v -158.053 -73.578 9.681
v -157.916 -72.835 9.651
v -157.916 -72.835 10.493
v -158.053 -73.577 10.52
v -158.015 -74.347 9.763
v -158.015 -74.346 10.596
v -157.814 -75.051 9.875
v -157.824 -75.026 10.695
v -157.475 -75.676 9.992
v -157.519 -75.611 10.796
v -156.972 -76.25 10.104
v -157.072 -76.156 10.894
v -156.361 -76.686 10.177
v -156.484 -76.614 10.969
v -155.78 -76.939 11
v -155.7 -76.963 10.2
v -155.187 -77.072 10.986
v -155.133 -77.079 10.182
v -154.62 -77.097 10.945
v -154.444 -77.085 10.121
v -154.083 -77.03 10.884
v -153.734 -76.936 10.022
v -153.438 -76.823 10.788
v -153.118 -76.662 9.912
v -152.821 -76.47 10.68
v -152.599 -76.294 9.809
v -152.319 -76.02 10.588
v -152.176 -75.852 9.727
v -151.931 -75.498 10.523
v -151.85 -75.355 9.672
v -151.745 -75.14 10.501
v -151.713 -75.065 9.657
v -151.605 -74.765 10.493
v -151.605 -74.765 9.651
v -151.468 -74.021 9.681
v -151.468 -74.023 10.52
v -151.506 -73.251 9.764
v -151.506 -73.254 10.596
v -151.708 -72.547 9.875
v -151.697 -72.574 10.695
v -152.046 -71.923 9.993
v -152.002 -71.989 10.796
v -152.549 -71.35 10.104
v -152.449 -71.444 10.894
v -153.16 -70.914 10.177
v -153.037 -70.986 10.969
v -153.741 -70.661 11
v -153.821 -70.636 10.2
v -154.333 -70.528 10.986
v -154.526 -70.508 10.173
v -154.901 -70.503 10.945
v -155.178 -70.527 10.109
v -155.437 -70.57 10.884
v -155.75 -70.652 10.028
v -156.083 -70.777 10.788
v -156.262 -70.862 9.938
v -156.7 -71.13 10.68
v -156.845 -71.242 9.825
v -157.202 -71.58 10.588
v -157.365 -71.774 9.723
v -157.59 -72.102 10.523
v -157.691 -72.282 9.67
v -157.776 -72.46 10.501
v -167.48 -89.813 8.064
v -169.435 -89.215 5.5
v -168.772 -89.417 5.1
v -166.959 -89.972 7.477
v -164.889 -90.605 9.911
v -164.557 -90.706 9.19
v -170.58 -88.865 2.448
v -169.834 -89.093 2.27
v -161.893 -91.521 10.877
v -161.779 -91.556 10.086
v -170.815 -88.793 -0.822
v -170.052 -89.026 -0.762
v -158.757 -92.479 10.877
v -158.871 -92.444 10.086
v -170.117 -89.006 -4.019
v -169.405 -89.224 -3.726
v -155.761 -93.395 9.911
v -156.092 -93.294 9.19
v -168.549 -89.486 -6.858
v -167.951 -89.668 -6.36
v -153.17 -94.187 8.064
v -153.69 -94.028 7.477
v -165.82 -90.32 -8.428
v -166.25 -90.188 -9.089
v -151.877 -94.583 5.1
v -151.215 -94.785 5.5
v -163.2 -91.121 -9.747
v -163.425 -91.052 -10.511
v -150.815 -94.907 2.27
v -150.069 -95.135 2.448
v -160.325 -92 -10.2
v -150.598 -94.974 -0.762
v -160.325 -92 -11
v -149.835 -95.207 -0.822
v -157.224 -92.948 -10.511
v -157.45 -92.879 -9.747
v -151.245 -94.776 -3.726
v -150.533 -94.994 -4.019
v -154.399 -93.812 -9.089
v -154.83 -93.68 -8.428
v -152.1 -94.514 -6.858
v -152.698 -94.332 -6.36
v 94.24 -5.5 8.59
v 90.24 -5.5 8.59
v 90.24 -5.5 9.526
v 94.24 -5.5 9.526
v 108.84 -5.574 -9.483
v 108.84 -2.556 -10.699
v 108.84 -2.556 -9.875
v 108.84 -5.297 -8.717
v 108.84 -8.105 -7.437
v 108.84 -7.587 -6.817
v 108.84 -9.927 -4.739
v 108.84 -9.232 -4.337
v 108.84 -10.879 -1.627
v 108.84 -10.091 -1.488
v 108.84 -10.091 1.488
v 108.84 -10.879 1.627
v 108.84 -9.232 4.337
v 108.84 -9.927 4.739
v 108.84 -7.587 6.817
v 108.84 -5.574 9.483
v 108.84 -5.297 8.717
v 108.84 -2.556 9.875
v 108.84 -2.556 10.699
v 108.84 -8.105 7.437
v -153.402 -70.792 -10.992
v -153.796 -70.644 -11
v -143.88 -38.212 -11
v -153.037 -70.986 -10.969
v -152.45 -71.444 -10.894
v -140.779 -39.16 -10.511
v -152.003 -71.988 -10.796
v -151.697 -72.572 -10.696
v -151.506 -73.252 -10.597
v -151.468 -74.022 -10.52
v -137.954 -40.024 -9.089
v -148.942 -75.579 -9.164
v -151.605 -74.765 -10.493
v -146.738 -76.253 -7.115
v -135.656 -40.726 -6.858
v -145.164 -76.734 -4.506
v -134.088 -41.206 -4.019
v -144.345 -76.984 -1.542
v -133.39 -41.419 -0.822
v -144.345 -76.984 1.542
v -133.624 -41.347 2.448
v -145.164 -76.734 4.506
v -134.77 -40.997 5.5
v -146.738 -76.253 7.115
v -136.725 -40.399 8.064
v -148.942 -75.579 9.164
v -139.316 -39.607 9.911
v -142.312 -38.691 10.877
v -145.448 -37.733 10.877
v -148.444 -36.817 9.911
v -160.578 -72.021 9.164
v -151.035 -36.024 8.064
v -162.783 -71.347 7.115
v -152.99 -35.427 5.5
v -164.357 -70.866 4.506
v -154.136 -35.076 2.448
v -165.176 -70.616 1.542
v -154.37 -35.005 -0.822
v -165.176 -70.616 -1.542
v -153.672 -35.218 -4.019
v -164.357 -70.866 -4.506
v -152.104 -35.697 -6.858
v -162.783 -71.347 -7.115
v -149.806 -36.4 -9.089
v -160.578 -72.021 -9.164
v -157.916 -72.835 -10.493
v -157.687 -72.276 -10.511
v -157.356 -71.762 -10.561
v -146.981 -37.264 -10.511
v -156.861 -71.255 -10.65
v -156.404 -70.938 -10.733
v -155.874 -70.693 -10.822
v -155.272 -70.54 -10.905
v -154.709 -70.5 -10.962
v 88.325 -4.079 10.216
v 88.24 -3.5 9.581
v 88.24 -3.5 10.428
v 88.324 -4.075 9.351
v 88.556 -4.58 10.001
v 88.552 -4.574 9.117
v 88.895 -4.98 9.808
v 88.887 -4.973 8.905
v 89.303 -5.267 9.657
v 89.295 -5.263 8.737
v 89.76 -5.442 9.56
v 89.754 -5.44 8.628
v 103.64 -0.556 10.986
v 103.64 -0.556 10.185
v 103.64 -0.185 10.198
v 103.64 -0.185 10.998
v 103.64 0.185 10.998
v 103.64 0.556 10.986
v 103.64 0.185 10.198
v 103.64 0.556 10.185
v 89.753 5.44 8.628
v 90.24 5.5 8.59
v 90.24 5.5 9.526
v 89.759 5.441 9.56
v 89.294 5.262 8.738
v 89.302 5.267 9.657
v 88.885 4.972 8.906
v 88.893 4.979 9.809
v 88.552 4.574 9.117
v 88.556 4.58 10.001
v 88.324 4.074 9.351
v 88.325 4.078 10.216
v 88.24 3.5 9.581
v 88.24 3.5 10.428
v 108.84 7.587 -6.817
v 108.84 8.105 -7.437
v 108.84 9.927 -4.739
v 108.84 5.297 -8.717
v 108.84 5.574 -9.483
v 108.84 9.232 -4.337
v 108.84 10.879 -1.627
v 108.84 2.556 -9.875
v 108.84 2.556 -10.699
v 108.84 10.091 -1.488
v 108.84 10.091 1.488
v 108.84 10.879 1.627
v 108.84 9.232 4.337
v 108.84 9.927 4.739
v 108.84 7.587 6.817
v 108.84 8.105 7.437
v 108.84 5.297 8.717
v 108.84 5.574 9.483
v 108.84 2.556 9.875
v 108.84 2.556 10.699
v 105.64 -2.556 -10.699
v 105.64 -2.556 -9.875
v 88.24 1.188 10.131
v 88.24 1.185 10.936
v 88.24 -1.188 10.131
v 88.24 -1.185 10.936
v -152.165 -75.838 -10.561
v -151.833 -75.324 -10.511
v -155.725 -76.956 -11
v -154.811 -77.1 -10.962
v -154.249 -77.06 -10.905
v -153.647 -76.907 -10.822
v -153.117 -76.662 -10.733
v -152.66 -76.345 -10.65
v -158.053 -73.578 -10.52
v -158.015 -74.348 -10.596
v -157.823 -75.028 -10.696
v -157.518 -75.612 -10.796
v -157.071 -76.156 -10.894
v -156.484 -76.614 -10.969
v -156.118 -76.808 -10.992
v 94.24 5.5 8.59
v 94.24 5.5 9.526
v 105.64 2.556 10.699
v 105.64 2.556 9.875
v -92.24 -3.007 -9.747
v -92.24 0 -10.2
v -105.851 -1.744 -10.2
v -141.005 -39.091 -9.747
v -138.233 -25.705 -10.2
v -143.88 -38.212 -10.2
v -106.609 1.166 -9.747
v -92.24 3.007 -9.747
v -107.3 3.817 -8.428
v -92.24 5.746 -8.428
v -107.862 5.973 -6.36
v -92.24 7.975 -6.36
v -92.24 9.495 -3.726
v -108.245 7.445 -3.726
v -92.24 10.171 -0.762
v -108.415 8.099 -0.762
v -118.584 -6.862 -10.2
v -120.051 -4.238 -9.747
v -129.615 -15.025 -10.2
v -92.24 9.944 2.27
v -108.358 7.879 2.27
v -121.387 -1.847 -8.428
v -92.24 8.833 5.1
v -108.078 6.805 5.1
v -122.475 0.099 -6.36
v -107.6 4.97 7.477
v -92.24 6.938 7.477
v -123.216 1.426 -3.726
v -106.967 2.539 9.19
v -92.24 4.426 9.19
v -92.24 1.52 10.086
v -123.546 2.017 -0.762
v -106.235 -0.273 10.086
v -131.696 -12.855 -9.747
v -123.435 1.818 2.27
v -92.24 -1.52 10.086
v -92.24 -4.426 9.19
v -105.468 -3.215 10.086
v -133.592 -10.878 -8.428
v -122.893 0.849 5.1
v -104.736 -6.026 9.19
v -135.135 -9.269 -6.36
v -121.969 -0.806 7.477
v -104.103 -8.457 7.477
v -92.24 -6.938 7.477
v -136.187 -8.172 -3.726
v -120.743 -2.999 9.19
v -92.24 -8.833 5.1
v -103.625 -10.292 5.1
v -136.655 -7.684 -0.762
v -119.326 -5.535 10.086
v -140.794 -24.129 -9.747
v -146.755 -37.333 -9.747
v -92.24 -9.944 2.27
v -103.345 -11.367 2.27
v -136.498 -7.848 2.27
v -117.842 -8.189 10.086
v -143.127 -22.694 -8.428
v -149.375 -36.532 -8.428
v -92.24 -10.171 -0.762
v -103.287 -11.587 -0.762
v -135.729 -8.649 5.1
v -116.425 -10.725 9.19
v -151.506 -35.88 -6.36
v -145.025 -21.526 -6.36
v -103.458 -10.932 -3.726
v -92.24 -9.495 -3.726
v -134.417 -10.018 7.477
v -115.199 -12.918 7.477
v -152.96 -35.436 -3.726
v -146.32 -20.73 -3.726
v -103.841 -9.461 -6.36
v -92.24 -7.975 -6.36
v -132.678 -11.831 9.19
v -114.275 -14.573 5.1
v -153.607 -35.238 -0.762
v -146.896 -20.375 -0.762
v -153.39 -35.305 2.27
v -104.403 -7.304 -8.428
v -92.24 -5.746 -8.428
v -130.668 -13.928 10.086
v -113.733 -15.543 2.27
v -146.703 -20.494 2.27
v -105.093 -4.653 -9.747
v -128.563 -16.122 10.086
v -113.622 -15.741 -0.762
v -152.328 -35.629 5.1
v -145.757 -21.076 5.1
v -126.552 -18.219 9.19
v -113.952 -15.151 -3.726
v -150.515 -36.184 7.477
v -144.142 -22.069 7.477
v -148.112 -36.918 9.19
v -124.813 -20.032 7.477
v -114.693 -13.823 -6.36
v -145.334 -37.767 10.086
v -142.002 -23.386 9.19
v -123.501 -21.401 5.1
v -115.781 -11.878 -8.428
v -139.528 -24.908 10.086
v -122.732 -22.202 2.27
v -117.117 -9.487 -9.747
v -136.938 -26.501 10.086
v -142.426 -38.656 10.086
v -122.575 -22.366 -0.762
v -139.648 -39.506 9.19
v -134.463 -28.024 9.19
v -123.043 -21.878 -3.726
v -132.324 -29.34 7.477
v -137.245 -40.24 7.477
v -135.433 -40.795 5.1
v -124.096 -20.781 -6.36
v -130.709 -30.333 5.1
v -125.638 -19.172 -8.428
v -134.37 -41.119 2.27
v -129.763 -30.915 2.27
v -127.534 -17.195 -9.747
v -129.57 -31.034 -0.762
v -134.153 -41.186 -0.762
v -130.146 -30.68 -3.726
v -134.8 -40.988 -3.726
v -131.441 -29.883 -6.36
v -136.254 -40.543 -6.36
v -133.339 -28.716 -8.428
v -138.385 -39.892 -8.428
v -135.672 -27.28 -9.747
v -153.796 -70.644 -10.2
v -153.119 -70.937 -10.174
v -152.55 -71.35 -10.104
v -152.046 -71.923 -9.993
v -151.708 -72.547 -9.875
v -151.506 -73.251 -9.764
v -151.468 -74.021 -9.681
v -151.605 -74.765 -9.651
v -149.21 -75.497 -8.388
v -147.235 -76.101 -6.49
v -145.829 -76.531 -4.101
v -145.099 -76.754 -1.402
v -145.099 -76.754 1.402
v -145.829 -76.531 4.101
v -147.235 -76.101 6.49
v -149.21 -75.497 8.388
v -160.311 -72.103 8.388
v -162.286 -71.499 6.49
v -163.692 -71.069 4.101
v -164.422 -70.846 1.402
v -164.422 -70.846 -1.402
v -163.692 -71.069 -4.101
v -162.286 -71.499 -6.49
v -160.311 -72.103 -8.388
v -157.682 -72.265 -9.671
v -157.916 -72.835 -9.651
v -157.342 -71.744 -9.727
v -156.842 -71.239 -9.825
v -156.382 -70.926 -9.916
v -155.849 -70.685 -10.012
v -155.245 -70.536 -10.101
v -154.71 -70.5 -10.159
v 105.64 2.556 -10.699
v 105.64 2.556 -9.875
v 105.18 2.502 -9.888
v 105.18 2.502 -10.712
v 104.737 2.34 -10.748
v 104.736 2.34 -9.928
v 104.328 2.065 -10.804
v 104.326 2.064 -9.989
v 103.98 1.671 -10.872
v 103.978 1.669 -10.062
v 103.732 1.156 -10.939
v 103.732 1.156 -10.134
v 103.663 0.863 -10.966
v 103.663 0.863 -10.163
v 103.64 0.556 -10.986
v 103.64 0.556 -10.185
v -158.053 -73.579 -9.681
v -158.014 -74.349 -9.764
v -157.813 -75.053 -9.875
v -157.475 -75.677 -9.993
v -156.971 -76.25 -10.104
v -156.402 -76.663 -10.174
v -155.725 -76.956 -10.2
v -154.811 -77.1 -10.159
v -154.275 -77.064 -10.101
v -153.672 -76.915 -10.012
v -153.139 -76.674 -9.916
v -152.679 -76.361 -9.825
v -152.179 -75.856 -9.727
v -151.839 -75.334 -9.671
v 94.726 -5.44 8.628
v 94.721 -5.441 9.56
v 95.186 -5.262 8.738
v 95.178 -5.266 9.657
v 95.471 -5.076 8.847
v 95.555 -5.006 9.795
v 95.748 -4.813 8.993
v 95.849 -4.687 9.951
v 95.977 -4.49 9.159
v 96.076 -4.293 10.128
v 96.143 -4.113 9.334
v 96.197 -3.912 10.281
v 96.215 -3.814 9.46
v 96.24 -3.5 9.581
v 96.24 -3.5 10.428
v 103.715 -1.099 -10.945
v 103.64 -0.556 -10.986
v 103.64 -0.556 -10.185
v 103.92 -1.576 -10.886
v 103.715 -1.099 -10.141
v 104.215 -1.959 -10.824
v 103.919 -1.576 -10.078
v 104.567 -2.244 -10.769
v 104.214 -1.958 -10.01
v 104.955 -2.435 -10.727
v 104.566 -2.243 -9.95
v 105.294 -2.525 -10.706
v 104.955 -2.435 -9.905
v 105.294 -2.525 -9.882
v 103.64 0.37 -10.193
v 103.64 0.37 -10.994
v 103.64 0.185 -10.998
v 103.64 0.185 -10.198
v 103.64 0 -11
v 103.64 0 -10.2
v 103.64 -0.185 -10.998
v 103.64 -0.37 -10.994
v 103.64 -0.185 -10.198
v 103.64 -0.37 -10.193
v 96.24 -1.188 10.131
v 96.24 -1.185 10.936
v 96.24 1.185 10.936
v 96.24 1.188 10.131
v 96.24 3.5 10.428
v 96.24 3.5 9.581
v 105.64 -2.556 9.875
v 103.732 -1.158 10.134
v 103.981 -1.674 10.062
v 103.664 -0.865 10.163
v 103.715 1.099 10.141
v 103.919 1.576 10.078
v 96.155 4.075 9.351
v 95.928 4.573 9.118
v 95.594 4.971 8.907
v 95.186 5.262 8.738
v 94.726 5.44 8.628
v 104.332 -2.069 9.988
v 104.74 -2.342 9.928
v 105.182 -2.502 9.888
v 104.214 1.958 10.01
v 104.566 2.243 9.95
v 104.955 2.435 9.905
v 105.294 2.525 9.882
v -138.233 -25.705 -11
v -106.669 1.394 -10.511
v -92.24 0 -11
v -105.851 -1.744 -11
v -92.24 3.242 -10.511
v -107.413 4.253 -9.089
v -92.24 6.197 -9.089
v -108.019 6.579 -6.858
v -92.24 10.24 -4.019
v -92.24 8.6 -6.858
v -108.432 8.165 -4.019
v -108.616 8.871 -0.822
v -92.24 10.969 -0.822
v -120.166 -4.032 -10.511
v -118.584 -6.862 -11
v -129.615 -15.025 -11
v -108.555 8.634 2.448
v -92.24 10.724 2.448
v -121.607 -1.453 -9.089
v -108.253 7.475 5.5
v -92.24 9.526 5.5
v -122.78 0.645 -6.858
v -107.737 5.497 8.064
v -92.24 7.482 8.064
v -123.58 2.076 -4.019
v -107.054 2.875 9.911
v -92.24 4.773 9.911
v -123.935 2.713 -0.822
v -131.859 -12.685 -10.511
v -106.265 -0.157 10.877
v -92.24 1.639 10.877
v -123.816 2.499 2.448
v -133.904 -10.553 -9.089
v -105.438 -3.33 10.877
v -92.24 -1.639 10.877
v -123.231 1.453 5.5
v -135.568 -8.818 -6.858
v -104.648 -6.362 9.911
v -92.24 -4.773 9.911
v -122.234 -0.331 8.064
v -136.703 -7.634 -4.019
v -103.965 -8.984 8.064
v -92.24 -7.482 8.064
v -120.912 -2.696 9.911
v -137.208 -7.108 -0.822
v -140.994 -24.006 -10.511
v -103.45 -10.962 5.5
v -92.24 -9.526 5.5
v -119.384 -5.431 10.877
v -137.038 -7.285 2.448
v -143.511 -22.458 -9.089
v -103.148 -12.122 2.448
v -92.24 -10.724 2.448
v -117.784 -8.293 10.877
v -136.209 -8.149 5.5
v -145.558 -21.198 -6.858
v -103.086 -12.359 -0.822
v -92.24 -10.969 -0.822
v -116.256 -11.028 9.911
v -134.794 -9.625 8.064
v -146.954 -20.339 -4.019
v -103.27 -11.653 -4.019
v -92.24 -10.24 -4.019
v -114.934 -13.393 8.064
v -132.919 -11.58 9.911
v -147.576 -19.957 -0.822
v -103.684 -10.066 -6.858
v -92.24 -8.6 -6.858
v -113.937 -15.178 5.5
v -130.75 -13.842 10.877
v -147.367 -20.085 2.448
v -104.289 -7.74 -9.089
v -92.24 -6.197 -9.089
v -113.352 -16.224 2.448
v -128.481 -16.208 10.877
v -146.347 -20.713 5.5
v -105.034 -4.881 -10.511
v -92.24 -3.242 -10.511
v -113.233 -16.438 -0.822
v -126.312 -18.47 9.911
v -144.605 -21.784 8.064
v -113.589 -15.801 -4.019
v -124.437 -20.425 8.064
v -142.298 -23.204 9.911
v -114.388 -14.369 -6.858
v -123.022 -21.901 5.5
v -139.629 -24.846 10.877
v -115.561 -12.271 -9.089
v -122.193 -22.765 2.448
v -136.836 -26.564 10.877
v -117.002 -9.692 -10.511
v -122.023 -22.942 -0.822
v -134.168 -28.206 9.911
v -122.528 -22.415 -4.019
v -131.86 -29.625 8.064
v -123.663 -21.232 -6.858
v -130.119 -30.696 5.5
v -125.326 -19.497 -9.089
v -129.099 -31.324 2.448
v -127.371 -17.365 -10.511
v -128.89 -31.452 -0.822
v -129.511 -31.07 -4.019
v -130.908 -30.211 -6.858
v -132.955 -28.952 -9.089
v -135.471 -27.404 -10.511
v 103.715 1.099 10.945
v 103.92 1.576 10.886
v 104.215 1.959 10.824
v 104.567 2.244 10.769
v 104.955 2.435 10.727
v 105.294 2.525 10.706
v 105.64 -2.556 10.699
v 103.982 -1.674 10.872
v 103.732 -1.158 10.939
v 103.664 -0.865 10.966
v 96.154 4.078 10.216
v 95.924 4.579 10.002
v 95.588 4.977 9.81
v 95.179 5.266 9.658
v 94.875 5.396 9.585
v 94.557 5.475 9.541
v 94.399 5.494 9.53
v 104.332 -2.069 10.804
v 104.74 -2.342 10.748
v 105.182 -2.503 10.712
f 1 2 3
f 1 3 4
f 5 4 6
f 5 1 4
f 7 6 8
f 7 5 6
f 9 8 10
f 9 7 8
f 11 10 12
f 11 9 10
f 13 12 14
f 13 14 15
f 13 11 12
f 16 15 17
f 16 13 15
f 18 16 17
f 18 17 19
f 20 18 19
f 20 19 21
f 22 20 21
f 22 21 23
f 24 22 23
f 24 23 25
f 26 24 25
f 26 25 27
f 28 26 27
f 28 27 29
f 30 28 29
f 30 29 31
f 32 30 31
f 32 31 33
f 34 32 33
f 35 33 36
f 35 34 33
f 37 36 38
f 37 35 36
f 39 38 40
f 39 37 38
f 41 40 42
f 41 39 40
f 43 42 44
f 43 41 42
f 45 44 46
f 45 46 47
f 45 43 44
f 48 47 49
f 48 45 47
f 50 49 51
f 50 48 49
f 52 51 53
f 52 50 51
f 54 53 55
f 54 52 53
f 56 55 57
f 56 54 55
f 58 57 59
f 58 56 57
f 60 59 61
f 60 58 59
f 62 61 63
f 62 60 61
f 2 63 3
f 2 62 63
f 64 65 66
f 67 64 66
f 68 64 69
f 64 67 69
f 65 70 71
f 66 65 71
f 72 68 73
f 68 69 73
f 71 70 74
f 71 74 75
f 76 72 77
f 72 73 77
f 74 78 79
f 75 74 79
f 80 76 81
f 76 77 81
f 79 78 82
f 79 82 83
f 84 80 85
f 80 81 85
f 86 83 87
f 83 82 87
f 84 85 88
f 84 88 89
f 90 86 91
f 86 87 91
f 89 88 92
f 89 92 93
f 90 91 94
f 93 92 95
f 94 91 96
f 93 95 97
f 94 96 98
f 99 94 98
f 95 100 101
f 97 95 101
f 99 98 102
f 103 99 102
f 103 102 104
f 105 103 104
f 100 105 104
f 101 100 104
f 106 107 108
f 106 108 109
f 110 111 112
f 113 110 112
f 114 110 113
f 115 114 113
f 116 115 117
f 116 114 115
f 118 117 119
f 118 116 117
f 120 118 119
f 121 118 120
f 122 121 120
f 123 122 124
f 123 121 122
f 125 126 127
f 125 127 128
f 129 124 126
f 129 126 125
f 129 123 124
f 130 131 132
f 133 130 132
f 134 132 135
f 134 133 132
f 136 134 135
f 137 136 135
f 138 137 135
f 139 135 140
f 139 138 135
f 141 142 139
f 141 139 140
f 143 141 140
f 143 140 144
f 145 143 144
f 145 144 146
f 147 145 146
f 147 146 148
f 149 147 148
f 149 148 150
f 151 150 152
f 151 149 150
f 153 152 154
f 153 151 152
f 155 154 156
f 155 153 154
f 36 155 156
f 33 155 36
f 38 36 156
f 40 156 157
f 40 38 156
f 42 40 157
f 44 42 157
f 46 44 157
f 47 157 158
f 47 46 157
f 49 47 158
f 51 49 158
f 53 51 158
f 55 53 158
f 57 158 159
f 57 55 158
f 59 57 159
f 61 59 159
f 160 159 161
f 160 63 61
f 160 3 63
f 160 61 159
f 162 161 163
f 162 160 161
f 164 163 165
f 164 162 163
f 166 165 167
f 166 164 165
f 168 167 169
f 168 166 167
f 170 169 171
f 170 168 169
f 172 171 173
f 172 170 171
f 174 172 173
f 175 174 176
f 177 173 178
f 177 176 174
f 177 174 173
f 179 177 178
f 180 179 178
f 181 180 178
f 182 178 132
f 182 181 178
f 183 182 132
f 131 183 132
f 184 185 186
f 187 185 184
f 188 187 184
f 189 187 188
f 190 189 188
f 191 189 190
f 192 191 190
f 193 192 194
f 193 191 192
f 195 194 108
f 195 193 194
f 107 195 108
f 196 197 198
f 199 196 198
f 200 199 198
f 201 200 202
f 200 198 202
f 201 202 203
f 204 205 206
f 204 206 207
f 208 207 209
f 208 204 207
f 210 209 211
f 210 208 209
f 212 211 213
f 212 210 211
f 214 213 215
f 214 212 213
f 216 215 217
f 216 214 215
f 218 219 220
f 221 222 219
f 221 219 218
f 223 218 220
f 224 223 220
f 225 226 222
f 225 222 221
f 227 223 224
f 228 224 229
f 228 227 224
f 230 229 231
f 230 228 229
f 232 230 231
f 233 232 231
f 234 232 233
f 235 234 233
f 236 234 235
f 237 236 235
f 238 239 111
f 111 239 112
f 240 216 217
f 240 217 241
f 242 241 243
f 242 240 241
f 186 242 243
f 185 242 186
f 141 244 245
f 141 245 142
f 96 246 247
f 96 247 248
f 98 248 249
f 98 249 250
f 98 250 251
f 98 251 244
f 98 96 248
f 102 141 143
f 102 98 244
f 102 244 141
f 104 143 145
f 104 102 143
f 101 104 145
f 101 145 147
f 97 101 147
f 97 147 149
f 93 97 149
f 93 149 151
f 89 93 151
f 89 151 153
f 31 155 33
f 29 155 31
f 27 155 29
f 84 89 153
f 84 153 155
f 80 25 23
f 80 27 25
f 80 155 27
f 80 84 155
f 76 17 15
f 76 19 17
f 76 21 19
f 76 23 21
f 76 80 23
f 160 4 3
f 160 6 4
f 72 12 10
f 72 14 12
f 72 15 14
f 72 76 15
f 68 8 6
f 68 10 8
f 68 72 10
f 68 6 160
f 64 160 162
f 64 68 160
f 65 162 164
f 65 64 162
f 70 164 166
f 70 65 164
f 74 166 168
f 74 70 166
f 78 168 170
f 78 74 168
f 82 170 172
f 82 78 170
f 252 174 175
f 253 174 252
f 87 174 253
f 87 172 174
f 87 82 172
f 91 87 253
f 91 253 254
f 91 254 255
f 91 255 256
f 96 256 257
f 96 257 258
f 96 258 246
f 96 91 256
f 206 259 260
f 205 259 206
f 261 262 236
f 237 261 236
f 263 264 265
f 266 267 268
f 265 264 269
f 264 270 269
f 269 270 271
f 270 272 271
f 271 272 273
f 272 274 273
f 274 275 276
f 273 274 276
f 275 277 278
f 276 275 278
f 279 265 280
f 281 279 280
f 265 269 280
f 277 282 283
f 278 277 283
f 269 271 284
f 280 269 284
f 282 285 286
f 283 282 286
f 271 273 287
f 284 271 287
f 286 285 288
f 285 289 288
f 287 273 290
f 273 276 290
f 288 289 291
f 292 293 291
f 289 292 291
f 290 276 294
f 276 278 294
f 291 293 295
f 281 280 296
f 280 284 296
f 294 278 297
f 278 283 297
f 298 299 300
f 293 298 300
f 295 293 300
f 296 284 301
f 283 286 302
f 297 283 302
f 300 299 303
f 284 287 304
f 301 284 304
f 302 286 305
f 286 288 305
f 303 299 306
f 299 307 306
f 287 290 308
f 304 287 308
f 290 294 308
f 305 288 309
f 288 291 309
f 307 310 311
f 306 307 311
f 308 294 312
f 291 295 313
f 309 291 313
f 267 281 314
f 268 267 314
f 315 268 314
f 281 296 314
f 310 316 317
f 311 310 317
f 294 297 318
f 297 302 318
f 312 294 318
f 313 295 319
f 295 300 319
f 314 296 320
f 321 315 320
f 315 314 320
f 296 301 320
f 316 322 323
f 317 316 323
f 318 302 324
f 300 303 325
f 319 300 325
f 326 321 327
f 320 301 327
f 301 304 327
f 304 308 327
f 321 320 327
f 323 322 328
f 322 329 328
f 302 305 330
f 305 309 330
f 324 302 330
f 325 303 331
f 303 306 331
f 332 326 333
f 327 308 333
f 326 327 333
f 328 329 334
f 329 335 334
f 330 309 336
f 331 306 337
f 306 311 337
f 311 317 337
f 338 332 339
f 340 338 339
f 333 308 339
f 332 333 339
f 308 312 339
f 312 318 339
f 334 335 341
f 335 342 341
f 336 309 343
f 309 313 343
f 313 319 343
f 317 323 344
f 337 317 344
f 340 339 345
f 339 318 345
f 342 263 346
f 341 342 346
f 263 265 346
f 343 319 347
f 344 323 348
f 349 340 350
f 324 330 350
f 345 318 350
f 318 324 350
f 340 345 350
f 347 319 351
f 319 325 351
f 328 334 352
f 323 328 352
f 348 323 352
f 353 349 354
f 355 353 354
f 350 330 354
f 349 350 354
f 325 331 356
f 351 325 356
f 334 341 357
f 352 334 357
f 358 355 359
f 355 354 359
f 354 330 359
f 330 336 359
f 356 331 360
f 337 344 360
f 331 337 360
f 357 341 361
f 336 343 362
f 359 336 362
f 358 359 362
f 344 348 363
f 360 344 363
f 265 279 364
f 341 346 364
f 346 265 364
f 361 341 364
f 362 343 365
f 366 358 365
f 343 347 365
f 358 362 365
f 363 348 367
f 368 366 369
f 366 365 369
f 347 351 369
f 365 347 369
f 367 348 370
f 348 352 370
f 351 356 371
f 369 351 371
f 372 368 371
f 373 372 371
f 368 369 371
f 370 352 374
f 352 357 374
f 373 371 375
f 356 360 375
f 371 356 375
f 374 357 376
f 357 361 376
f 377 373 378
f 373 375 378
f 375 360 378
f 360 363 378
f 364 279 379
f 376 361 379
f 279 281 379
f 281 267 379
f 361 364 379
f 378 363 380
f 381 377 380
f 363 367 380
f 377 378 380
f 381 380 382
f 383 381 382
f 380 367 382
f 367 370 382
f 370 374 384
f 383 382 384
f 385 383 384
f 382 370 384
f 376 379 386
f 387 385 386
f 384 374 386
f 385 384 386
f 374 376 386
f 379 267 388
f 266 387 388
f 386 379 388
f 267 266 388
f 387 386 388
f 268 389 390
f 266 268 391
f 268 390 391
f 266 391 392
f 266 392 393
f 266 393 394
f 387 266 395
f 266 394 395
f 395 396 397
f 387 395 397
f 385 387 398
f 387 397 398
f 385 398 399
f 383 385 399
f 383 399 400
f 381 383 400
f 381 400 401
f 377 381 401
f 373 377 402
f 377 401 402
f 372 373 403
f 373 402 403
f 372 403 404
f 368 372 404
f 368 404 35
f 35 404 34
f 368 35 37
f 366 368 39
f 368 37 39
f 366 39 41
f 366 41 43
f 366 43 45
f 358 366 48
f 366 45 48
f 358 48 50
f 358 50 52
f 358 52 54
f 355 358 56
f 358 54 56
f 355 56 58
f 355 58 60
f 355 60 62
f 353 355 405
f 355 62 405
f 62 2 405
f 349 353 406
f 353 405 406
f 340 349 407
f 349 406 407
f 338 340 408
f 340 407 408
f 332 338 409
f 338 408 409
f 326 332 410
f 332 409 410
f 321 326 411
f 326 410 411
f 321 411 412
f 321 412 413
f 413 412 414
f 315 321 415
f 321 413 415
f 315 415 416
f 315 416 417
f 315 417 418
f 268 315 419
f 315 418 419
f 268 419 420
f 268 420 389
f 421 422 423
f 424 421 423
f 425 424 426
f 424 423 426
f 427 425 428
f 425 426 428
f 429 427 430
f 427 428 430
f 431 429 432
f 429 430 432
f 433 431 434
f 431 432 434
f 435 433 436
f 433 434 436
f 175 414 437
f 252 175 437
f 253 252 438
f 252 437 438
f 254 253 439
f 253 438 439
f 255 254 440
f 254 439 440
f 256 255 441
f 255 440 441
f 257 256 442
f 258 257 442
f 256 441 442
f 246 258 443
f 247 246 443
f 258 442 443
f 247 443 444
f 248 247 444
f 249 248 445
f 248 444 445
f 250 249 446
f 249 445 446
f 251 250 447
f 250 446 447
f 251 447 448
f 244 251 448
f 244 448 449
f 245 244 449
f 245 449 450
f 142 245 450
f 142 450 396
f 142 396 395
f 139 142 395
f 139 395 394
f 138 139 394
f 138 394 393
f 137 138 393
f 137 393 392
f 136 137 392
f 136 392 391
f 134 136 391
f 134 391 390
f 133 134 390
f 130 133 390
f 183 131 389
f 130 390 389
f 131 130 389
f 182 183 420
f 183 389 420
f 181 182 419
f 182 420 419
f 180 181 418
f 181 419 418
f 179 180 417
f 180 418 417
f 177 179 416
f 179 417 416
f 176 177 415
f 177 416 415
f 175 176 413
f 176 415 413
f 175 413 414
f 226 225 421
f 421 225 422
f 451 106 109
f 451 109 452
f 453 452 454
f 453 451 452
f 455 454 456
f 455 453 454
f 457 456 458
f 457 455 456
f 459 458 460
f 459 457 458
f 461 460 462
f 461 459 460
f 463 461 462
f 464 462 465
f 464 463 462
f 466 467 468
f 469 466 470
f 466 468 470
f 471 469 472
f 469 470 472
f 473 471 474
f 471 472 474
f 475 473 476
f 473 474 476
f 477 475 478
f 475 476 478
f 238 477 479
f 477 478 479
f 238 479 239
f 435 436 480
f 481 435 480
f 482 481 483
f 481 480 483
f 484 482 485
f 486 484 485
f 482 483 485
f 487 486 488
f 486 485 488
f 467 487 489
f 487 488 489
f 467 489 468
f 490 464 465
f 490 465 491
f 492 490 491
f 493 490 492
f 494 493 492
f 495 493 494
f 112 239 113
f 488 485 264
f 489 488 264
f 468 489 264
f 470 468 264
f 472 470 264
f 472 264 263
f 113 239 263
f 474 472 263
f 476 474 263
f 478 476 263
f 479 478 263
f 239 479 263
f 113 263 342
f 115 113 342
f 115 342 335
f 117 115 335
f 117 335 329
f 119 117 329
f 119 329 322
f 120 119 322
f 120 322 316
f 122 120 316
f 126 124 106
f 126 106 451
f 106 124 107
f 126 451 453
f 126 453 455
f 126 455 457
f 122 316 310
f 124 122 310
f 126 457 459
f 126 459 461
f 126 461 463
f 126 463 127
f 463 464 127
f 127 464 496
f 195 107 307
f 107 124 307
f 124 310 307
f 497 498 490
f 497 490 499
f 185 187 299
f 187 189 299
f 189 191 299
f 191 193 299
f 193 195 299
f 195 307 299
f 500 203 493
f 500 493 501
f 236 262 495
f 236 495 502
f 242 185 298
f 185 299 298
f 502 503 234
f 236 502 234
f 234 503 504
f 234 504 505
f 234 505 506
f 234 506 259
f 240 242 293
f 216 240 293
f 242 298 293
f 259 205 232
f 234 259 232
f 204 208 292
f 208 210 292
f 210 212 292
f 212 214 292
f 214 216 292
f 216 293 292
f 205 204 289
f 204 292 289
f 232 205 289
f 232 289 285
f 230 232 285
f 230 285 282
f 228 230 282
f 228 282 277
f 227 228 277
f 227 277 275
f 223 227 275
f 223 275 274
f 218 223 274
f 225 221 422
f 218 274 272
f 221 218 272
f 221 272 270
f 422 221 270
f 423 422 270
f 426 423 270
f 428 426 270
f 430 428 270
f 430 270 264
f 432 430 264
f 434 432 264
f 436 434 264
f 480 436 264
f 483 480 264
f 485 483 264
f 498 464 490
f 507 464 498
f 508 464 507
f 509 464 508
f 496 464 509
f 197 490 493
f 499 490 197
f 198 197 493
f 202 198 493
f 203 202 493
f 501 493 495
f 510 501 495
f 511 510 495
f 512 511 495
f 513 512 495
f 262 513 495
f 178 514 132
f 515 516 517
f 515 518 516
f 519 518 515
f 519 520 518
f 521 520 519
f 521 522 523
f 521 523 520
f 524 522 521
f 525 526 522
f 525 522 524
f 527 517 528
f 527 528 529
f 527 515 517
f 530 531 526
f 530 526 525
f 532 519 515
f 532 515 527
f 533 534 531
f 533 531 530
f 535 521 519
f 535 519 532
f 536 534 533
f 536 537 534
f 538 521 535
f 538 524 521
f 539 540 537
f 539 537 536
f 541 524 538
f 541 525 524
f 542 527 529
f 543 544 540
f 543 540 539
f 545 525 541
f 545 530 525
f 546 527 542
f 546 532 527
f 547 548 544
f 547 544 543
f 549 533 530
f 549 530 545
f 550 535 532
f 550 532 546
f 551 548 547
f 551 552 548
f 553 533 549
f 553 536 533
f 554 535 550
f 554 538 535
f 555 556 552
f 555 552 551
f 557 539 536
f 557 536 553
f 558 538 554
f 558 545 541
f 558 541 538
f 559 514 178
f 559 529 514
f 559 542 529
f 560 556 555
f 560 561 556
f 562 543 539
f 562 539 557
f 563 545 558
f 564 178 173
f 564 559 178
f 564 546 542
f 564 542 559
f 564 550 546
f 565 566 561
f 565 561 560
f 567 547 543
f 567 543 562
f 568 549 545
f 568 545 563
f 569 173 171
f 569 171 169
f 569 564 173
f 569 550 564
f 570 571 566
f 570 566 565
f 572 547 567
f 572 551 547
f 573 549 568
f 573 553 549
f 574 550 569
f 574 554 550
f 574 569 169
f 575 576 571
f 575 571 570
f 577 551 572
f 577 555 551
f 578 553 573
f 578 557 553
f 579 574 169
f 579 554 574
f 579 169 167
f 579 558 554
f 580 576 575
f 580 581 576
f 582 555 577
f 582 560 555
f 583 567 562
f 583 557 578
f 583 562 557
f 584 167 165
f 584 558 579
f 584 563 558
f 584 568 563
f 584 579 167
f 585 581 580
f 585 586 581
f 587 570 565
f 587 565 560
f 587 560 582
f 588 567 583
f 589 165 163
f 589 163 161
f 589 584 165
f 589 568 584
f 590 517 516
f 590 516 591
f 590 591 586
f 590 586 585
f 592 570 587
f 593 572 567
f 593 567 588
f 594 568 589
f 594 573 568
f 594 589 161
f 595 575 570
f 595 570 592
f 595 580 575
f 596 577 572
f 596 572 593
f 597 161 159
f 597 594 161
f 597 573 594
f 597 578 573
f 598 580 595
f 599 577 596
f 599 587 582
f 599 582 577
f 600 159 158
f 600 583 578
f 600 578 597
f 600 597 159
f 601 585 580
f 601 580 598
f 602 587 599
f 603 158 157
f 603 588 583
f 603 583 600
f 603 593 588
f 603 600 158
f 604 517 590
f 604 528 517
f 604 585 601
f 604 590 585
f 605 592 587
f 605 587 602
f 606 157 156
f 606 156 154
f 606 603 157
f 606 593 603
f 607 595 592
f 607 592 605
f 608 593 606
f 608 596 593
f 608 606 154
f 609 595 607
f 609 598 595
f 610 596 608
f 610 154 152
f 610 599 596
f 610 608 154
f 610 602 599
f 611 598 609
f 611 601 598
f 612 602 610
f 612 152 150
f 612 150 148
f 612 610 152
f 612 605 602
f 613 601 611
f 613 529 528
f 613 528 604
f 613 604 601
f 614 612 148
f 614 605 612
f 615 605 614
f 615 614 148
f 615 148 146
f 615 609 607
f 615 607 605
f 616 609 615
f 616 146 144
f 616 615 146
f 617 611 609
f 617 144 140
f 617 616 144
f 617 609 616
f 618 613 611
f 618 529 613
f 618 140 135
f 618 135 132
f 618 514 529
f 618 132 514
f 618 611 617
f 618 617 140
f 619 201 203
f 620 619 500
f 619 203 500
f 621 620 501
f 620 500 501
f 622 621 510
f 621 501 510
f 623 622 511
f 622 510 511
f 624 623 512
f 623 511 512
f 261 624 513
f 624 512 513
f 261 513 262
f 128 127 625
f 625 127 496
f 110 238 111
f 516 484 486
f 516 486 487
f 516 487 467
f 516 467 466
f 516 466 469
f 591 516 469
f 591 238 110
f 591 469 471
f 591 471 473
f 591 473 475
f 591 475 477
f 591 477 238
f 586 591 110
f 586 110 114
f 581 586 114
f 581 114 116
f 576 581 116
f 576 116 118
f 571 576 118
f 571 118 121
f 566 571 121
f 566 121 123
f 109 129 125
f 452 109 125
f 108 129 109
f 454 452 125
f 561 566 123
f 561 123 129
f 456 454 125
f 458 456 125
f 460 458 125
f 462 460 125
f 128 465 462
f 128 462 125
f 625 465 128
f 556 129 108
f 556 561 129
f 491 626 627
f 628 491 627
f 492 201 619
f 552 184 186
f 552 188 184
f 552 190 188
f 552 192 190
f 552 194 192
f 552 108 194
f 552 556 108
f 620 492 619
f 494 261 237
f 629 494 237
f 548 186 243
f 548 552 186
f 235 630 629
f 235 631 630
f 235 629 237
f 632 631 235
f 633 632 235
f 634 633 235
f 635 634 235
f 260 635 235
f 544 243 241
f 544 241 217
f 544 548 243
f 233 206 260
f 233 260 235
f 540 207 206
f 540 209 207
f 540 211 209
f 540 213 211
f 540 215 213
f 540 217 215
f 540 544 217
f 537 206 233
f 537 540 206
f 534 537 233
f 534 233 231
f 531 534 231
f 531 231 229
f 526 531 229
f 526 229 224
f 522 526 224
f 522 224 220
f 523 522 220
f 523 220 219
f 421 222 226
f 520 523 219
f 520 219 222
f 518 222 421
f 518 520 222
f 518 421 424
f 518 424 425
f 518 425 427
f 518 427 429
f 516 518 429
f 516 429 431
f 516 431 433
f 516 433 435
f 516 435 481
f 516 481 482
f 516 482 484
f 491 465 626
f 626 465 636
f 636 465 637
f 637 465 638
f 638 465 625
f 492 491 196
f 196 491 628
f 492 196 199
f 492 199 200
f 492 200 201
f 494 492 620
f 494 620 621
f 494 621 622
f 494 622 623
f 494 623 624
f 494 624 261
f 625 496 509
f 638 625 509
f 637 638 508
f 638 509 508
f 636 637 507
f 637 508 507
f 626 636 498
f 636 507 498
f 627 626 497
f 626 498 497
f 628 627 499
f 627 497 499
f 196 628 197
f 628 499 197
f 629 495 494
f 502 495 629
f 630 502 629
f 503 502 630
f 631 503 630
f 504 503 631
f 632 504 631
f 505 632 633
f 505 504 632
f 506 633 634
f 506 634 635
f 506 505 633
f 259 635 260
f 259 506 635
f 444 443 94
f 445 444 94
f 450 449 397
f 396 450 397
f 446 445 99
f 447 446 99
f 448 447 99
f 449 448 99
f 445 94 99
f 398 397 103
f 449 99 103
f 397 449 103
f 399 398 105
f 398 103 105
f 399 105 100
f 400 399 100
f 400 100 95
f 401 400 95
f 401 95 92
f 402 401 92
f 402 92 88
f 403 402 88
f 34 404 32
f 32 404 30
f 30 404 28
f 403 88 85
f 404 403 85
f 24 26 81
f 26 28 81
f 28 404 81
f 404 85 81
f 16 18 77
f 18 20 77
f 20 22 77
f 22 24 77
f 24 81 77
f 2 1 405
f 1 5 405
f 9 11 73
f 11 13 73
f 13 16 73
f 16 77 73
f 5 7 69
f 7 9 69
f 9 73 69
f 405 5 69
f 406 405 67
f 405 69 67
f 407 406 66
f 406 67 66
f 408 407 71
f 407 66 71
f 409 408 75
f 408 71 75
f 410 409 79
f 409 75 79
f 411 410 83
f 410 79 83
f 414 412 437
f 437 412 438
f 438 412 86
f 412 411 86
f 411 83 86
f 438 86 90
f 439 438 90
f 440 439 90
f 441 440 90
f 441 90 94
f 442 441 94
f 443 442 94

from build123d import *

# Parameters (mm, degrees)
SKETCH3_R          = 11
SKETCH3_R_2        = 10.2
CUT_EXTRUDE1_REACH = 197.895
SKETCH4_R          = 3.3
SKETCH5_R          = 3.3
CUT_EXTRUDE2_DEPTH = 196.894862351
CUT_EXTRUDE3_DEPTH = 196.894862351


with BuildPart() as part:
    # Sweep2: sweep along a path in Sketch1
    with BuildLine(Plane.XY) as sweep2_path:
        Line((108.839588828, 0), (92.239588828, 0))
        Line((92.239588828, 0), (-92.239588828, 0))
        ThreePointArc((-92.239588828, 0), (-124.360019313, -10.591729527), (-143.88004565, -38.211927945))
        Line((-143.88004565, -38.211927945), (-154.760411172, -73.8))
        Line((-154.760411172, -73.8), (-160.324709574, -92))
    # Sketch3 → Sweep2 (sweep)
    with BuildSketch(Plane(origin=(92.239588828, 0, 0), x_dir=(0, 0, -1), z_dir=(1, 0, 0))):
        Circle(SKETCH3_R)
        Circle(SKETCH3_R_2, mode=Mode.SUBTRACT)
    sweep(path=sweep2_path.line)

    # Sketch4 → Cut-Extrude1 (cut, up to next)
    with BuildSketch(Plane.XY, mode=Mode.PRIVATE) as cut_extrude1_sk1:
        with Locations((-154.760411172, -73.8)):
            Circle(SKETCH4_R)
    cut_extrude1_tool1 = extrude(cut_extrude1_sk1.sketch, amount=CUT_EXTRUDE1_REACH, mode=Mode.PRIVATE) & part.part
    # Sketch4 → Cut-Extrude1 (cut, up to next)
    with BuildSketch(Plane.XY, mode=Mode.PRIVATE) as cut_extrude1_sk2:
        with BuildLine():
            Line((108.839588828, 2.555545653), (108.839588828, -2.555545653))
            Line((108.839588828, -2.555545653), (105.639588828, -2.555545653))
            ThreePointArc((105.639588828, -2.555545653), (104.225375266, -1.969759216), (103.639588828, -0.555545653))
            Line((103.639588828, -0.555545653), (103.639588828, 0.555545653))
            ThreePointArc((103.639588828, 0.555545653), (104.225375266, 1.969759216), (105.639588828, 2.555545653))
            Line((105.639588828, 2.555545653), (108.839588828, 2.555545653))
        make_face()
    cut_extrude1_tool2 = extrude(cut_extrude1_sk2.sketch, amount=CUT_EXTRUDE1_REACH, mode=Mode.PRIVATE) & part.part
    # Sketch4 → Cut-Extrude1 (cut, up to next)
    with BuildSketch(Plane.XY, mode=Mode.PRIVATE) as cut_extrude1_sk3:
        with BuildLine():
            Line((90.239588828, -5.5), (94.239588828, -5.5))
            ThreePointArc((94.239588828, -5.5), (95.653802391, -4.914213562), (96.239588828, -3.5))
            Line((96.239588828, -3.5), (96.239588828, 3.5))
            ThreePointArc((96.239588828, 3.5), (95.653802391, 4.914213562), (94.239588828, 5.5))
            Line((94.239588828, 5.5), (90.239588828, 5.5))
            ThreePointArc((90.239588828, 5.5), (88.825375266, 4.914213562), (88.239588828, 3.5))
            Line((88.239588828, 3.5), (88.239588828, -3.5))
            ThreePointArc((88.239588828, -3.5), (88.825375266, -4.914213562), (90.239588828, -5.5))
        make_face()
    cut_extrude1_tool3 = extrude(cut_extrude1_sk3.sketch, amount=CUT_EXTRUDE1_REACH, mode=Mode.PRIVATE) & part.part
    add(cut_extrude1_tool1.solids().sort_by_distance((-154.760411, -73.8, 0))[0], mode=Mode.SUBTRACT)
    add(cut_extrude1_tool2.solids().sort_by_distance((106.388287, 0, 0))[0], mode=Mode.SUBTRACT)
    add(cut_extrude1_tool3.solids().sort_by_distance((92.239589, 0, 0))[0], mode=Mode.SUBTRACT)

    # Sketch5 → Cut-Extrude2 (cut, through all)
    with BuildSketch(Plane.XY):
        with Locations((-154.760411172, -73.8)):
            Circle(SKETCH5_R)
    extrude(amount=-CUT_EXTRUDE2_DEPTH, mode=Mode.SUBTRACT)

    # Sketch6 → Cut-Extrude3 (cut, through all)
    with BuildSketch(Plane.XY):
        with BuildLine():
            Line((108.839588828, 2.555545653), (105.639588828, 2.555545653))
            ThreePointArc((105.639588828, 2.555545653), (104.225375266, 1.969759216), (103.639588828, 0.555545653))
            Line((103.639588828, 0.555545653), (103.639588828, -0.555545653))
            ThreePointArc((103.639588828, -0.555545653), (104.225375266, -1.969759216), (105.639588828, -2.555545653))
            Line((105.639588828, -2.555545653), (108.839588828, -2.555545653))
            Line((108.839588828, -2.555545653), (108.839588828, 2.555545653))
        make_face()
    extrude(amount=-CUT_EXTRUDE3_DEPTH, mode=Mode.SUBTRACT)


solid = part.part
